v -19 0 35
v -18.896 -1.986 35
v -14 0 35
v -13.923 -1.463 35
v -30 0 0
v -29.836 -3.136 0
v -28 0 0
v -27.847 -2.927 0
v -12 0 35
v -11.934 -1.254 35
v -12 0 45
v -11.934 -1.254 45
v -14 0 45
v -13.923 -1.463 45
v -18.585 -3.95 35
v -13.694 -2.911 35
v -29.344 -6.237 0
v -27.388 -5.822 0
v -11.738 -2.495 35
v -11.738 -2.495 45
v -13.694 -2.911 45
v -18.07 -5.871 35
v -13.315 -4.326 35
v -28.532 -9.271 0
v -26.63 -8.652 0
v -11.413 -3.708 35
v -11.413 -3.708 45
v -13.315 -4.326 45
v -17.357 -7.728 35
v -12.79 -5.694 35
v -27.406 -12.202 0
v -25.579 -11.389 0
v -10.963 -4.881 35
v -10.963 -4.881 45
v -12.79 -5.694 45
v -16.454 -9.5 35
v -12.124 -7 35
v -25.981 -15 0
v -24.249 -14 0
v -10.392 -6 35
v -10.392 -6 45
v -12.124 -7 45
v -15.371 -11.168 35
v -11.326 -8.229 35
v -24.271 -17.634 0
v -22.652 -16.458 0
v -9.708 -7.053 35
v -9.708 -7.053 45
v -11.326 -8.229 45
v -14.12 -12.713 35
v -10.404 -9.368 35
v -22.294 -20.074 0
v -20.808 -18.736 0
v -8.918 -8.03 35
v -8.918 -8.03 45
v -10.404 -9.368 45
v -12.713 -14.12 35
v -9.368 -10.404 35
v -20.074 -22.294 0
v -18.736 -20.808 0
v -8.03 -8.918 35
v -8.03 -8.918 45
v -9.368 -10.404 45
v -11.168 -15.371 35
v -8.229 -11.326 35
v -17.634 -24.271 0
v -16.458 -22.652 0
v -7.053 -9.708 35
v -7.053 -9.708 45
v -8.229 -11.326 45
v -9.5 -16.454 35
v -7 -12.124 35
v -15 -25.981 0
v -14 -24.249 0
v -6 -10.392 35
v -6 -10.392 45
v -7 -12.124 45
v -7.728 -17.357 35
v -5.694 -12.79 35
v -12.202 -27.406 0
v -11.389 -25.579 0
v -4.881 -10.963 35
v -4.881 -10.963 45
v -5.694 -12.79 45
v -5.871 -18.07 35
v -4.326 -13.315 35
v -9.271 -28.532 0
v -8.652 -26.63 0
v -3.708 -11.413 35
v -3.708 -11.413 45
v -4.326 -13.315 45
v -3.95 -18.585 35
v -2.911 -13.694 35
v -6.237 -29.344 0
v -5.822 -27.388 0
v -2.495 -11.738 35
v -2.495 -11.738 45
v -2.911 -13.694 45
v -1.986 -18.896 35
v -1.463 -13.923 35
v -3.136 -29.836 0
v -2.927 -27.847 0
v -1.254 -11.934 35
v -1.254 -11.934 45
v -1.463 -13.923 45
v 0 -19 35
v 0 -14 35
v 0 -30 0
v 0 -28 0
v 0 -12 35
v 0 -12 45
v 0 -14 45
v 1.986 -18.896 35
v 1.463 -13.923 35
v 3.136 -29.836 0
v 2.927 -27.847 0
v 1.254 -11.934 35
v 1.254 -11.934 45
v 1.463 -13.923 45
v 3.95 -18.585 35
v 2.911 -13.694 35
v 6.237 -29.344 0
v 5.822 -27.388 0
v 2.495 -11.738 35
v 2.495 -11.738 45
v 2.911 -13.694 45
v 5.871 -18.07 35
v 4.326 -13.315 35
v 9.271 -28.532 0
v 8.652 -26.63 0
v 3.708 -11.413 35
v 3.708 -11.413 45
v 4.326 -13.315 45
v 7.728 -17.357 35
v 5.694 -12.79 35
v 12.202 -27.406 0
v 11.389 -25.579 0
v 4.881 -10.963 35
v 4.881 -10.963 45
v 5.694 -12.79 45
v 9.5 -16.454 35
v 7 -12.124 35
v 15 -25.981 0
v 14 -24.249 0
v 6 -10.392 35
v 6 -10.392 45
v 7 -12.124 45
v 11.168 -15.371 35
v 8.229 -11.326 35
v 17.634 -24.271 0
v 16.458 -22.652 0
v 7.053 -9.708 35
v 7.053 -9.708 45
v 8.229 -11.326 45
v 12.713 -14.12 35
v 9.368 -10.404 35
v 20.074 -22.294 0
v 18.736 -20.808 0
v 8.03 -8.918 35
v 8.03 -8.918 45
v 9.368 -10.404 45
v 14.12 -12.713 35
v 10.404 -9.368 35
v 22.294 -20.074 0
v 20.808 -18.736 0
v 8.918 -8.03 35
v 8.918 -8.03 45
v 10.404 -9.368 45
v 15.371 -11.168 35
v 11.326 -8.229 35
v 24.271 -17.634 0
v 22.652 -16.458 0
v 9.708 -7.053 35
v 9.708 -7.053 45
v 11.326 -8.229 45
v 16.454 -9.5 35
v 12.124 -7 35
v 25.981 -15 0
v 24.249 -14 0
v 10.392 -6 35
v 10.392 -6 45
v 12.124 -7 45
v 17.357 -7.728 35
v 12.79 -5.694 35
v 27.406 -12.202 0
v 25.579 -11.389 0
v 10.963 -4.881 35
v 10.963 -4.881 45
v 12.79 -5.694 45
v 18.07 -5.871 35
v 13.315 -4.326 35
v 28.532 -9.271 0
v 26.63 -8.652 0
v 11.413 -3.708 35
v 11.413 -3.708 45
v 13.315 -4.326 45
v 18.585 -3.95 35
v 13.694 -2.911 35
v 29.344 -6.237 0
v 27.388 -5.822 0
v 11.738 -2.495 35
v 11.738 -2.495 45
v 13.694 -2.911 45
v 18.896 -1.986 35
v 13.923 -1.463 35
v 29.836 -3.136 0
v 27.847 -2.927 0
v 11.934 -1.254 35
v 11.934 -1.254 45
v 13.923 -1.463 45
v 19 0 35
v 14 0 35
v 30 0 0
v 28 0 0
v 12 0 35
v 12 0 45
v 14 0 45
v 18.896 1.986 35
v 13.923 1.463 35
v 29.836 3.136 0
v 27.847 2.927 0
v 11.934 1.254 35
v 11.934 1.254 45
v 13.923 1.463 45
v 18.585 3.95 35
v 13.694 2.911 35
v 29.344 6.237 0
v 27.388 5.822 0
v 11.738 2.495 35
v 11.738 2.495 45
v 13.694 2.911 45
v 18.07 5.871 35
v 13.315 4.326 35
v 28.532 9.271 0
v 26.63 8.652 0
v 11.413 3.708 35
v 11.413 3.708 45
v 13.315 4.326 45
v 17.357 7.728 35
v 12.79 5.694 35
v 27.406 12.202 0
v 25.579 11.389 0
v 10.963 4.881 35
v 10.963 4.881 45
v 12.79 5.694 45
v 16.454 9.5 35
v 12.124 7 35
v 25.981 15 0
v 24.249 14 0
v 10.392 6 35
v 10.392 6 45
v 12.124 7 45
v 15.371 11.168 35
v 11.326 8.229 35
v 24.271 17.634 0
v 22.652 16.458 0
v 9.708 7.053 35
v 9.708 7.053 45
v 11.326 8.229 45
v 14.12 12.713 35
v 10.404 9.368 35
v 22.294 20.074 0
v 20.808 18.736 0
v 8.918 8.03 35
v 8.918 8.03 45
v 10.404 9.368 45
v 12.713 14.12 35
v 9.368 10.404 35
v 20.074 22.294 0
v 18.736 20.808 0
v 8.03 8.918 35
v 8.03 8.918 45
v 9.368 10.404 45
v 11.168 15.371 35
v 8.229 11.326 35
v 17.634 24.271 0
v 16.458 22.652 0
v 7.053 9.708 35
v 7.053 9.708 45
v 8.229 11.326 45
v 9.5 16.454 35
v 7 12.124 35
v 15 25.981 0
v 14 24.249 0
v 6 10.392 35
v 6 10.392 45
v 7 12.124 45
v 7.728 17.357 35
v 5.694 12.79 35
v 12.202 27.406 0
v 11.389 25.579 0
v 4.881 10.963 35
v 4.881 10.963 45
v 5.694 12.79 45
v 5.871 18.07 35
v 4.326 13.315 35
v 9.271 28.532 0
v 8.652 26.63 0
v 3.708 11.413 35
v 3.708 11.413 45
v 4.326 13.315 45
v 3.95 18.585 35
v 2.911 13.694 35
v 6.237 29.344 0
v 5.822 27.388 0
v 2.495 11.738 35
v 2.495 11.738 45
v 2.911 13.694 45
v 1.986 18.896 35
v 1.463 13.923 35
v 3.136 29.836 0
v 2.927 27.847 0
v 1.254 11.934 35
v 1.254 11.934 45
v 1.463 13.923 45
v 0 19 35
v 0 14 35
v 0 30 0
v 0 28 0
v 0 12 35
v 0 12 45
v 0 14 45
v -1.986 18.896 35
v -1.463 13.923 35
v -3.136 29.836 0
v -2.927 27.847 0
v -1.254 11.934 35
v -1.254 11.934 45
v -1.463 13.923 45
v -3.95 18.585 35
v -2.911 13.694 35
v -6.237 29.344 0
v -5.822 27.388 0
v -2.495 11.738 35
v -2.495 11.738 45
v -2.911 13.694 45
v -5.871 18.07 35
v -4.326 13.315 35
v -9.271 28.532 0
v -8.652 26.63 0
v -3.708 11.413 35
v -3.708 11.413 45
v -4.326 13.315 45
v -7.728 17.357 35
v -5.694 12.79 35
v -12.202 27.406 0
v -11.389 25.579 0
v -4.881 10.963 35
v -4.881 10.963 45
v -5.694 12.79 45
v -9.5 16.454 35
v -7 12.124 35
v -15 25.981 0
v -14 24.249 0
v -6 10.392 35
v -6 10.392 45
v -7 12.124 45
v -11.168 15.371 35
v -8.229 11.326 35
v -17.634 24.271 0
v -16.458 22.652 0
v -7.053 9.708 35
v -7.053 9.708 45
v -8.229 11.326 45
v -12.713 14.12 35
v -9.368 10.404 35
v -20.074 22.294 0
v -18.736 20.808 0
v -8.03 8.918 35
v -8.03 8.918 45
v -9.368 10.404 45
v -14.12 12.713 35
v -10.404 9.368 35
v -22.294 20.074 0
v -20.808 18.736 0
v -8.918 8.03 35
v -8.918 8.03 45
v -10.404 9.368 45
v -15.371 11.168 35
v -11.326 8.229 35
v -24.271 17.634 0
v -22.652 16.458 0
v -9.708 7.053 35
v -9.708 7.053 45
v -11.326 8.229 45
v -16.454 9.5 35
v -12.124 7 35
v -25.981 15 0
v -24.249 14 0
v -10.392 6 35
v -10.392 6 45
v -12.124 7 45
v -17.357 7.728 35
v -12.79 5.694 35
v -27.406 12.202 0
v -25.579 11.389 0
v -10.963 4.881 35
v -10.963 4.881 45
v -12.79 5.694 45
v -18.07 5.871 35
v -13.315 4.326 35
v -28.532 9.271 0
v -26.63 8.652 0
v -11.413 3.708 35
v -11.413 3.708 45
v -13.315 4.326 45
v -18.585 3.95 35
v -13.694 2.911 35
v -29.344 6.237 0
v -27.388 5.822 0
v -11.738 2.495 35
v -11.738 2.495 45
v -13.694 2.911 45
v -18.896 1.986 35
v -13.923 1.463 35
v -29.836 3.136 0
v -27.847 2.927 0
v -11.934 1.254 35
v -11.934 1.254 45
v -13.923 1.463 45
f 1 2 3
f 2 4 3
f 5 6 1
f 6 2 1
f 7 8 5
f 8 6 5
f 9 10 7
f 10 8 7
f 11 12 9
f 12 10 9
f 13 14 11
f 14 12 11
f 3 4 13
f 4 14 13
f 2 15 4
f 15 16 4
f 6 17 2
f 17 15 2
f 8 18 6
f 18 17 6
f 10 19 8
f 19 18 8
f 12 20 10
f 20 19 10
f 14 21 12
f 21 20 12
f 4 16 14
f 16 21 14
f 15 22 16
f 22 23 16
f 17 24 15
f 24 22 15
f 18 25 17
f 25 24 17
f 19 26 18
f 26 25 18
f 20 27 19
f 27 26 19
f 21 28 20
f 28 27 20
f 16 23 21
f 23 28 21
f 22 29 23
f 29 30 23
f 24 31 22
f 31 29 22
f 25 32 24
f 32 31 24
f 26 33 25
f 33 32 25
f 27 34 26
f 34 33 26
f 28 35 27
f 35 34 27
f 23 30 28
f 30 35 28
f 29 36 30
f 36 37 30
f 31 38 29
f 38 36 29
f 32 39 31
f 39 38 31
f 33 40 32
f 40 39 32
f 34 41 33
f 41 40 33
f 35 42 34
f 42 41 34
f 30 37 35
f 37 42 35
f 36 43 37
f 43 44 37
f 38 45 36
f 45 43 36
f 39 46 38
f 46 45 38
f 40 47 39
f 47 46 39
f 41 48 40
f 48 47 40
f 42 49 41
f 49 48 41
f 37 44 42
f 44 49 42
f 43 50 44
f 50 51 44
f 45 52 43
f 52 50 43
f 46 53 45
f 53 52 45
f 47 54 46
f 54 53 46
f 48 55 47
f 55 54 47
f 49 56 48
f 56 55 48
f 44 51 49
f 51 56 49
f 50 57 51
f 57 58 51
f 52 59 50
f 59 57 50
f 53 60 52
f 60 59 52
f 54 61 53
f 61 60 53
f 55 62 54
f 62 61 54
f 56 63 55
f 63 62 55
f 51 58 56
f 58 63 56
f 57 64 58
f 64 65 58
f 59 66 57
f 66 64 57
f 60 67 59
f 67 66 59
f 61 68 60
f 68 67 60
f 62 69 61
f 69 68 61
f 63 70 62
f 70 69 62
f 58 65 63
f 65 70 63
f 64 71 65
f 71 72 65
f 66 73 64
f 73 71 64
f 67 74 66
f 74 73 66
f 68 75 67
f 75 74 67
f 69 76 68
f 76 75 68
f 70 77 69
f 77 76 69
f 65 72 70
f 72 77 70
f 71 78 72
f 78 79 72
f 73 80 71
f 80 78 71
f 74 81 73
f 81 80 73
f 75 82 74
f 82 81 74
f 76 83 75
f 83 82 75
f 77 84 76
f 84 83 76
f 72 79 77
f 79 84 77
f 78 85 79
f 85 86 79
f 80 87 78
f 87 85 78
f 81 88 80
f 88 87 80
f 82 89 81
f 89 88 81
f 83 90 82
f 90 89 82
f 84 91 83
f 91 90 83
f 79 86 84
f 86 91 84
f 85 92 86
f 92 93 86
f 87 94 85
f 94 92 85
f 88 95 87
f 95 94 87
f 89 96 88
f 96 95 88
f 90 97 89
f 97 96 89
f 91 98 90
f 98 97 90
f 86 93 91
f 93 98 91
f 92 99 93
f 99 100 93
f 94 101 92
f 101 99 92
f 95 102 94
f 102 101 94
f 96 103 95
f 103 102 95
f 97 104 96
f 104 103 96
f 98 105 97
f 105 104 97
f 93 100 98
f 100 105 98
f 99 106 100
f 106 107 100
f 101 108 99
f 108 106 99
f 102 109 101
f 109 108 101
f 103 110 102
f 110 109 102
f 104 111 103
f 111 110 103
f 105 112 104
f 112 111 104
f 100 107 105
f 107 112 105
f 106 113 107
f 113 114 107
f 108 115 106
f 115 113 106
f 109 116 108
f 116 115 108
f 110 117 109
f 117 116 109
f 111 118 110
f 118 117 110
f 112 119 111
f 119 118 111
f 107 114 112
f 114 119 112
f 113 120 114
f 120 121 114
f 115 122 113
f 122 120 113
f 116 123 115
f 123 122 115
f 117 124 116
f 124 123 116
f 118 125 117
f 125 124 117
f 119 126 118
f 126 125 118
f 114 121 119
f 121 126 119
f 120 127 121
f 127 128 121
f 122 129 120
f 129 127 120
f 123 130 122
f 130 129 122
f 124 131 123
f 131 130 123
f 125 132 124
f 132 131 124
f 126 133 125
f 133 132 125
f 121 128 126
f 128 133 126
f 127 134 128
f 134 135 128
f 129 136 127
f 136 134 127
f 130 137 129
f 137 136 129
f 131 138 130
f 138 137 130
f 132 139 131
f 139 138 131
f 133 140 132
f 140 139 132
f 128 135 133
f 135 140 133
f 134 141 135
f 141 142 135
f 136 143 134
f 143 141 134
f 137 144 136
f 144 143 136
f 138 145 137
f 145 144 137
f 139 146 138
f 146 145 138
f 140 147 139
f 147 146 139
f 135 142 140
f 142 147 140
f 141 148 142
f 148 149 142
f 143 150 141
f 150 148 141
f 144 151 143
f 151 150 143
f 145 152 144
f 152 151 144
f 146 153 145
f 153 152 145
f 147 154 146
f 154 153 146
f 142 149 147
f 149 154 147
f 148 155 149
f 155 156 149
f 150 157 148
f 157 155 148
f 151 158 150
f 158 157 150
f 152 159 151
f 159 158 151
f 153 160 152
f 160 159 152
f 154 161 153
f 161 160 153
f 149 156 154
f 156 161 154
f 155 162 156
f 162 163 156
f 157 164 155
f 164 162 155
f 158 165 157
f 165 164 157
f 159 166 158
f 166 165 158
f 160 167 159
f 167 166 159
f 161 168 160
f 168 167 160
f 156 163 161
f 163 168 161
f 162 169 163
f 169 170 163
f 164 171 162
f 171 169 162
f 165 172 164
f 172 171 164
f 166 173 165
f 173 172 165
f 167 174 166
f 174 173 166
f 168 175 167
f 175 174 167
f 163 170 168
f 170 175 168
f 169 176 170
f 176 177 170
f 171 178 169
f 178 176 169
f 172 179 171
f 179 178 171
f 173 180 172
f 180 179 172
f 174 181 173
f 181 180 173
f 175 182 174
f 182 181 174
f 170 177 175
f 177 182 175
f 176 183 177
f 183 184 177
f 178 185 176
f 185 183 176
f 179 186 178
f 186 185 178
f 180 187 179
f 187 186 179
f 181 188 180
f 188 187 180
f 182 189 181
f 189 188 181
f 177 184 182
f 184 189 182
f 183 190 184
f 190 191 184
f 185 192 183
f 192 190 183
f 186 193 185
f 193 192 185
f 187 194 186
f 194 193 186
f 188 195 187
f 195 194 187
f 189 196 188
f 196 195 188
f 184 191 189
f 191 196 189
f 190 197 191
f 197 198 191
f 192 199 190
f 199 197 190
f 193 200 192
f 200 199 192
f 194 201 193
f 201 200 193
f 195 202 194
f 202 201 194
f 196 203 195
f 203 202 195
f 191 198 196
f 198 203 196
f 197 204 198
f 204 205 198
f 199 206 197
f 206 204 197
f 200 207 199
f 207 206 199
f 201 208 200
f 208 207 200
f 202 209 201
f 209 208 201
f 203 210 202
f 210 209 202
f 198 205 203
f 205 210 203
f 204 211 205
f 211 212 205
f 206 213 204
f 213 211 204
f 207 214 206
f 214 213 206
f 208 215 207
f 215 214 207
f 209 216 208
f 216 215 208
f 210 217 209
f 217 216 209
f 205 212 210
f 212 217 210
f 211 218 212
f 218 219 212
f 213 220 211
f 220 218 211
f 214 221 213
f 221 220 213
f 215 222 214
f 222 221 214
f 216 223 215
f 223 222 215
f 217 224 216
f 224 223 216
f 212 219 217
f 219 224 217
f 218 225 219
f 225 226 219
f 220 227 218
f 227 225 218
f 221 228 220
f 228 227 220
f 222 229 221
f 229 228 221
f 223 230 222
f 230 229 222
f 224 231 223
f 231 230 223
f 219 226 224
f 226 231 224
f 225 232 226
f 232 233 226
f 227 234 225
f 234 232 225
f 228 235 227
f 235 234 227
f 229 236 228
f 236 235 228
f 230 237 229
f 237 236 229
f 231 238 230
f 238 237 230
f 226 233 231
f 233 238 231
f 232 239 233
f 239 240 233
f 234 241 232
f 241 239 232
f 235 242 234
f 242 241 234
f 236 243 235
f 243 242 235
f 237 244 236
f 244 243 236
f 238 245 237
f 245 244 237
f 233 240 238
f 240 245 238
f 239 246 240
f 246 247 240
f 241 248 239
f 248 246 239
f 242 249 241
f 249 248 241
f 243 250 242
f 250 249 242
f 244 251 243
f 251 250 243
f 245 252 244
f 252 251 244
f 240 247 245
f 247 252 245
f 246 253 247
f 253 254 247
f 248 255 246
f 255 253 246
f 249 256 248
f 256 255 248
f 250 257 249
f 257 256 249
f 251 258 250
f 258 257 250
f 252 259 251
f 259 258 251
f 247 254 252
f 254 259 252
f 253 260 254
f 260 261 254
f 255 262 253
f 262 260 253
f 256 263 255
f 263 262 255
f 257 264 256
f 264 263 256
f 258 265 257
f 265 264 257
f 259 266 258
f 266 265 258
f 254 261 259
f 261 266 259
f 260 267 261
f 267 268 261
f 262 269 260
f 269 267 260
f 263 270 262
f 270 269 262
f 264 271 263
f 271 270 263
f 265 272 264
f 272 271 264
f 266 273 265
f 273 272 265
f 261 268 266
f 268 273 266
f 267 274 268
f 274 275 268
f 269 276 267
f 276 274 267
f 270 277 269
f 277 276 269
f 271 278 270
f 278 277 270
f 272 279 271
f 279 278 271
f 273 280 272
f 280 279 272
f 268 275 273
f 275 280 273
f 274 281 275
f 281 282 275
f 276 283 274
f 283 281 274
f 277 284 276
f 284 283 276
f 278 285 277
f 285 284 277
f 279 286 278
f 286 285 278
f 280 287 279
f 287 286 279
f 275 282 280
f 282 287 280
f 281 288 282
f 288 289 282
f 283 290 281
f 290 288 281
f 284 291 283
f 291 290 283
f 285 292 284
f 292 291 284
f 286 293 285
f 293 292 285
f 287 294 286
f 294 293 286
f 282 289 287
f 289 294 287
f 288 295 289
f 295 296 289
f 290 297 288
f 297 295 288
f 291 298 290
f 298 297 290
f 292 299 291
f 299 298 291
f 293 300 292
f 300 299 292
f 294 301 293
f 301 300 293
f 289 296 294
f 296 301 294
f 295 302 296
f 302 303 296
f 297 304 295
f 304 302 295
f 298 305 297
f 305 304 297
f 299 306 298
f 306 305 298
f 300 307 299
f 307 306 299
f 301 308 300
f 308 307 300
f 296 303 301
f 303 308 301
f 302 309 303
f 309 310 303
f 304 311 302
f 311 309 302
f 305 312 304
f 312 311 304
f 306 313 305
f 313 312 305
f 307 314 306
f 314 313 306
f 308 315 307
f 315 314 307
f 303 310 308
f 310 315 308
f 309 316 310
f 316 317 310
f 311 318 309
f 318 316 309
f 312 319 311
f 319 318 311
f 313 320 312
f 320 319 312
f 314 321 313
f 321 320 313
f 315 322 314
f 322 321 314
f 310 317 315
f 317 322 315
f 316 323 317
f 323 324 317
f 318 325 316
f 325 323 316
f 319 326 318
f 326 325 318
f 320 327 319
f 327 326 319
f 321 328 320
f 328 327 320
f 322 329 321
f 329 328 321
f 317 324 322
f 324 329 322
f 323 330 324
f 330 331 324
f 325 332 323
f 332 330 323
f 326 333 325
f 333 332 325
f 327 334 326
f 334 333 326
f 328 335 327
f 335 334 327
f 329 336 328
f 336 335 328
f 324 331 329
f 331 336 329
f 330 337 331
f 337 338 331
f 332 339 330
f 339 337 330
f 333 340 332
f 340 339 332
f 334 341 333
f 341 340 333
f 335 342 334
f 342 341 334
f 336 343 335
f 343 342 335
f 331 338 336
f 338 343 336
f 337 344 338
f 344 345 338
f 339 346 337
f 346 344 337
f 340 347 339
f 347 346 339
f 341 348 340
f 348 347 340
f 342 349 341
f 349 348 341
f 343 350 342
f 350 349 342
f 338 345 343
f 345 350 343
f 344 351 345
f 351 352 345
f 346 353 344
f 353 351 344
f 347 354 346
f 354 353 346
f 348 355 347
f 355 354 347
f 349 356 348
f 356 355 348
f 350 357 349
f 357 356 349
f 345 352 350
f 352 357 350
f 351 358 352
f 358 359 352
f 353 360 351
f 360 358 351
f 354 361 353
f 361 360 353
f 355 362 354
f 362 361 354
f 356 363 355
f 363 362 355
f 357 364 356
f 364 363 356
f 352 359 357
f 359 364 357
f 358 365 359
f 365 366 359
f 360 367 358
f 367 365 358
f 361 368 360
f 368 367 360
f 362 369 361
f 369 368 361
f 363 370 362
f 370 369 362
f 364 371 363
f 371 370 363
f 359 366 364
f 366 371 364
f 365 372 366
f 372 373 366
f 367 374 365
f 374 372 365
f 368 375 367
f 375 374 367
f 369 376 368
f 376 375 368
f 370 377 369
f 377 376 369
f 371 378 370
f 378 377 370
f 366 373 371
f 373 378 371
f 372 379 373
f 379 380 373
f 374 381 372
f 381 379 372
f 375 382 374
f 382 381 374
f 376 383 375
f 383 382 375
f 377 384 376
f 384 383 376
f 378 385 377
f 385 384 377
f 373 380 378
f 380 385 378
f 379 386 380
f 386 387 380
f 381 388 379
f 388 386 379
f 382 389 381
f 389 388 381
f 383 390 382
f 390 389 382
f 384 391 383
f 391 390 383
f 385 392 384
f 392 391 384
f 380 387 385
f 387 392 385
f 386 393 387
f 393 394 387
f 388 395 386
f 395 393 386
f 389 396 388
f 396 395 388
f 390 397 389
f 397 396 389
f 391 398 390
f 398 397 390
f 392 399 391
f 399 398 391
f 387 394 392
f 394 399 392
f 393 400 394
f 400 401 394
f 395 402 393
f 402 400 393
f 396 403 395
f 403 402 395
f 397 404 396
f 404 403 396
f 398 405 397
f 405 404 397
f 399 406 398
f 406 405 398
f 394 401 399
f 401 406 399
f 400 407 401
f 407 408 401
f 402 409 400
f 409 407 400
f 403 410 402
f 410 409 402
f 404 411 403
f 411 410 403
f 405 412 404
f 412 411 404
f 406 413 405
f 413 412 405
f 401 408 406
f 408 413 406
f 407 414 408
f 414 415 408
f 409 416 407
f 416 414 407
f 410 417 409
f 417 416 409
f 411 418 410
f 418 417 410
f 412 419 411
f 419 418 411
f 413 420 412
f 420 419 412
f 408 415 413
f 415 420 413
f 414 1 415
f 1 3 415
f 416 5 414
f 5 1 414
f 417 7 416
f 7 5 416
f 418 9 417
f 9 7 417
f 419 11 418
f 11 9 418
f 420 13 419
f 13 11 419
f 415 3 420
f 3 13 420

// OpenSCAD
// file: ../lib/pepper_funnel.scad
//
module pepper_funnel() {
    translate([0,0,45]) rotate( [180, 0, 0]) {
       rotate_extrude($fn=60) funnel_profile();
    }
}
// file: ../lib/funnel_profile.scad
// Funnel profile

module funnel_profile() {

//  od_top : Diameter of top of funnel
//  id_mill : Inner diameter of pepper mill
//  od_mill : Outer diameter of pepper mill
//  depth : How deep to insert in mill

  polygon(points=[
            [(id_mill/2)-2,0],
            [(id_mill/2),0],
            [(id_mill/2),10],
            [(od_mill/2),depth],
            [30,(od_top/2)],
            [28,(od_top/2)],
            [(id_mill/2)-2,depth]
          ]);
}
// main file
include <../lib/funnel_profile.scad>
include <../lib/pepper_funnel.scad>

od_top = 90;
id_mill = 28;
od_mill = 38;
depth = 10;

pepper_funnel();
